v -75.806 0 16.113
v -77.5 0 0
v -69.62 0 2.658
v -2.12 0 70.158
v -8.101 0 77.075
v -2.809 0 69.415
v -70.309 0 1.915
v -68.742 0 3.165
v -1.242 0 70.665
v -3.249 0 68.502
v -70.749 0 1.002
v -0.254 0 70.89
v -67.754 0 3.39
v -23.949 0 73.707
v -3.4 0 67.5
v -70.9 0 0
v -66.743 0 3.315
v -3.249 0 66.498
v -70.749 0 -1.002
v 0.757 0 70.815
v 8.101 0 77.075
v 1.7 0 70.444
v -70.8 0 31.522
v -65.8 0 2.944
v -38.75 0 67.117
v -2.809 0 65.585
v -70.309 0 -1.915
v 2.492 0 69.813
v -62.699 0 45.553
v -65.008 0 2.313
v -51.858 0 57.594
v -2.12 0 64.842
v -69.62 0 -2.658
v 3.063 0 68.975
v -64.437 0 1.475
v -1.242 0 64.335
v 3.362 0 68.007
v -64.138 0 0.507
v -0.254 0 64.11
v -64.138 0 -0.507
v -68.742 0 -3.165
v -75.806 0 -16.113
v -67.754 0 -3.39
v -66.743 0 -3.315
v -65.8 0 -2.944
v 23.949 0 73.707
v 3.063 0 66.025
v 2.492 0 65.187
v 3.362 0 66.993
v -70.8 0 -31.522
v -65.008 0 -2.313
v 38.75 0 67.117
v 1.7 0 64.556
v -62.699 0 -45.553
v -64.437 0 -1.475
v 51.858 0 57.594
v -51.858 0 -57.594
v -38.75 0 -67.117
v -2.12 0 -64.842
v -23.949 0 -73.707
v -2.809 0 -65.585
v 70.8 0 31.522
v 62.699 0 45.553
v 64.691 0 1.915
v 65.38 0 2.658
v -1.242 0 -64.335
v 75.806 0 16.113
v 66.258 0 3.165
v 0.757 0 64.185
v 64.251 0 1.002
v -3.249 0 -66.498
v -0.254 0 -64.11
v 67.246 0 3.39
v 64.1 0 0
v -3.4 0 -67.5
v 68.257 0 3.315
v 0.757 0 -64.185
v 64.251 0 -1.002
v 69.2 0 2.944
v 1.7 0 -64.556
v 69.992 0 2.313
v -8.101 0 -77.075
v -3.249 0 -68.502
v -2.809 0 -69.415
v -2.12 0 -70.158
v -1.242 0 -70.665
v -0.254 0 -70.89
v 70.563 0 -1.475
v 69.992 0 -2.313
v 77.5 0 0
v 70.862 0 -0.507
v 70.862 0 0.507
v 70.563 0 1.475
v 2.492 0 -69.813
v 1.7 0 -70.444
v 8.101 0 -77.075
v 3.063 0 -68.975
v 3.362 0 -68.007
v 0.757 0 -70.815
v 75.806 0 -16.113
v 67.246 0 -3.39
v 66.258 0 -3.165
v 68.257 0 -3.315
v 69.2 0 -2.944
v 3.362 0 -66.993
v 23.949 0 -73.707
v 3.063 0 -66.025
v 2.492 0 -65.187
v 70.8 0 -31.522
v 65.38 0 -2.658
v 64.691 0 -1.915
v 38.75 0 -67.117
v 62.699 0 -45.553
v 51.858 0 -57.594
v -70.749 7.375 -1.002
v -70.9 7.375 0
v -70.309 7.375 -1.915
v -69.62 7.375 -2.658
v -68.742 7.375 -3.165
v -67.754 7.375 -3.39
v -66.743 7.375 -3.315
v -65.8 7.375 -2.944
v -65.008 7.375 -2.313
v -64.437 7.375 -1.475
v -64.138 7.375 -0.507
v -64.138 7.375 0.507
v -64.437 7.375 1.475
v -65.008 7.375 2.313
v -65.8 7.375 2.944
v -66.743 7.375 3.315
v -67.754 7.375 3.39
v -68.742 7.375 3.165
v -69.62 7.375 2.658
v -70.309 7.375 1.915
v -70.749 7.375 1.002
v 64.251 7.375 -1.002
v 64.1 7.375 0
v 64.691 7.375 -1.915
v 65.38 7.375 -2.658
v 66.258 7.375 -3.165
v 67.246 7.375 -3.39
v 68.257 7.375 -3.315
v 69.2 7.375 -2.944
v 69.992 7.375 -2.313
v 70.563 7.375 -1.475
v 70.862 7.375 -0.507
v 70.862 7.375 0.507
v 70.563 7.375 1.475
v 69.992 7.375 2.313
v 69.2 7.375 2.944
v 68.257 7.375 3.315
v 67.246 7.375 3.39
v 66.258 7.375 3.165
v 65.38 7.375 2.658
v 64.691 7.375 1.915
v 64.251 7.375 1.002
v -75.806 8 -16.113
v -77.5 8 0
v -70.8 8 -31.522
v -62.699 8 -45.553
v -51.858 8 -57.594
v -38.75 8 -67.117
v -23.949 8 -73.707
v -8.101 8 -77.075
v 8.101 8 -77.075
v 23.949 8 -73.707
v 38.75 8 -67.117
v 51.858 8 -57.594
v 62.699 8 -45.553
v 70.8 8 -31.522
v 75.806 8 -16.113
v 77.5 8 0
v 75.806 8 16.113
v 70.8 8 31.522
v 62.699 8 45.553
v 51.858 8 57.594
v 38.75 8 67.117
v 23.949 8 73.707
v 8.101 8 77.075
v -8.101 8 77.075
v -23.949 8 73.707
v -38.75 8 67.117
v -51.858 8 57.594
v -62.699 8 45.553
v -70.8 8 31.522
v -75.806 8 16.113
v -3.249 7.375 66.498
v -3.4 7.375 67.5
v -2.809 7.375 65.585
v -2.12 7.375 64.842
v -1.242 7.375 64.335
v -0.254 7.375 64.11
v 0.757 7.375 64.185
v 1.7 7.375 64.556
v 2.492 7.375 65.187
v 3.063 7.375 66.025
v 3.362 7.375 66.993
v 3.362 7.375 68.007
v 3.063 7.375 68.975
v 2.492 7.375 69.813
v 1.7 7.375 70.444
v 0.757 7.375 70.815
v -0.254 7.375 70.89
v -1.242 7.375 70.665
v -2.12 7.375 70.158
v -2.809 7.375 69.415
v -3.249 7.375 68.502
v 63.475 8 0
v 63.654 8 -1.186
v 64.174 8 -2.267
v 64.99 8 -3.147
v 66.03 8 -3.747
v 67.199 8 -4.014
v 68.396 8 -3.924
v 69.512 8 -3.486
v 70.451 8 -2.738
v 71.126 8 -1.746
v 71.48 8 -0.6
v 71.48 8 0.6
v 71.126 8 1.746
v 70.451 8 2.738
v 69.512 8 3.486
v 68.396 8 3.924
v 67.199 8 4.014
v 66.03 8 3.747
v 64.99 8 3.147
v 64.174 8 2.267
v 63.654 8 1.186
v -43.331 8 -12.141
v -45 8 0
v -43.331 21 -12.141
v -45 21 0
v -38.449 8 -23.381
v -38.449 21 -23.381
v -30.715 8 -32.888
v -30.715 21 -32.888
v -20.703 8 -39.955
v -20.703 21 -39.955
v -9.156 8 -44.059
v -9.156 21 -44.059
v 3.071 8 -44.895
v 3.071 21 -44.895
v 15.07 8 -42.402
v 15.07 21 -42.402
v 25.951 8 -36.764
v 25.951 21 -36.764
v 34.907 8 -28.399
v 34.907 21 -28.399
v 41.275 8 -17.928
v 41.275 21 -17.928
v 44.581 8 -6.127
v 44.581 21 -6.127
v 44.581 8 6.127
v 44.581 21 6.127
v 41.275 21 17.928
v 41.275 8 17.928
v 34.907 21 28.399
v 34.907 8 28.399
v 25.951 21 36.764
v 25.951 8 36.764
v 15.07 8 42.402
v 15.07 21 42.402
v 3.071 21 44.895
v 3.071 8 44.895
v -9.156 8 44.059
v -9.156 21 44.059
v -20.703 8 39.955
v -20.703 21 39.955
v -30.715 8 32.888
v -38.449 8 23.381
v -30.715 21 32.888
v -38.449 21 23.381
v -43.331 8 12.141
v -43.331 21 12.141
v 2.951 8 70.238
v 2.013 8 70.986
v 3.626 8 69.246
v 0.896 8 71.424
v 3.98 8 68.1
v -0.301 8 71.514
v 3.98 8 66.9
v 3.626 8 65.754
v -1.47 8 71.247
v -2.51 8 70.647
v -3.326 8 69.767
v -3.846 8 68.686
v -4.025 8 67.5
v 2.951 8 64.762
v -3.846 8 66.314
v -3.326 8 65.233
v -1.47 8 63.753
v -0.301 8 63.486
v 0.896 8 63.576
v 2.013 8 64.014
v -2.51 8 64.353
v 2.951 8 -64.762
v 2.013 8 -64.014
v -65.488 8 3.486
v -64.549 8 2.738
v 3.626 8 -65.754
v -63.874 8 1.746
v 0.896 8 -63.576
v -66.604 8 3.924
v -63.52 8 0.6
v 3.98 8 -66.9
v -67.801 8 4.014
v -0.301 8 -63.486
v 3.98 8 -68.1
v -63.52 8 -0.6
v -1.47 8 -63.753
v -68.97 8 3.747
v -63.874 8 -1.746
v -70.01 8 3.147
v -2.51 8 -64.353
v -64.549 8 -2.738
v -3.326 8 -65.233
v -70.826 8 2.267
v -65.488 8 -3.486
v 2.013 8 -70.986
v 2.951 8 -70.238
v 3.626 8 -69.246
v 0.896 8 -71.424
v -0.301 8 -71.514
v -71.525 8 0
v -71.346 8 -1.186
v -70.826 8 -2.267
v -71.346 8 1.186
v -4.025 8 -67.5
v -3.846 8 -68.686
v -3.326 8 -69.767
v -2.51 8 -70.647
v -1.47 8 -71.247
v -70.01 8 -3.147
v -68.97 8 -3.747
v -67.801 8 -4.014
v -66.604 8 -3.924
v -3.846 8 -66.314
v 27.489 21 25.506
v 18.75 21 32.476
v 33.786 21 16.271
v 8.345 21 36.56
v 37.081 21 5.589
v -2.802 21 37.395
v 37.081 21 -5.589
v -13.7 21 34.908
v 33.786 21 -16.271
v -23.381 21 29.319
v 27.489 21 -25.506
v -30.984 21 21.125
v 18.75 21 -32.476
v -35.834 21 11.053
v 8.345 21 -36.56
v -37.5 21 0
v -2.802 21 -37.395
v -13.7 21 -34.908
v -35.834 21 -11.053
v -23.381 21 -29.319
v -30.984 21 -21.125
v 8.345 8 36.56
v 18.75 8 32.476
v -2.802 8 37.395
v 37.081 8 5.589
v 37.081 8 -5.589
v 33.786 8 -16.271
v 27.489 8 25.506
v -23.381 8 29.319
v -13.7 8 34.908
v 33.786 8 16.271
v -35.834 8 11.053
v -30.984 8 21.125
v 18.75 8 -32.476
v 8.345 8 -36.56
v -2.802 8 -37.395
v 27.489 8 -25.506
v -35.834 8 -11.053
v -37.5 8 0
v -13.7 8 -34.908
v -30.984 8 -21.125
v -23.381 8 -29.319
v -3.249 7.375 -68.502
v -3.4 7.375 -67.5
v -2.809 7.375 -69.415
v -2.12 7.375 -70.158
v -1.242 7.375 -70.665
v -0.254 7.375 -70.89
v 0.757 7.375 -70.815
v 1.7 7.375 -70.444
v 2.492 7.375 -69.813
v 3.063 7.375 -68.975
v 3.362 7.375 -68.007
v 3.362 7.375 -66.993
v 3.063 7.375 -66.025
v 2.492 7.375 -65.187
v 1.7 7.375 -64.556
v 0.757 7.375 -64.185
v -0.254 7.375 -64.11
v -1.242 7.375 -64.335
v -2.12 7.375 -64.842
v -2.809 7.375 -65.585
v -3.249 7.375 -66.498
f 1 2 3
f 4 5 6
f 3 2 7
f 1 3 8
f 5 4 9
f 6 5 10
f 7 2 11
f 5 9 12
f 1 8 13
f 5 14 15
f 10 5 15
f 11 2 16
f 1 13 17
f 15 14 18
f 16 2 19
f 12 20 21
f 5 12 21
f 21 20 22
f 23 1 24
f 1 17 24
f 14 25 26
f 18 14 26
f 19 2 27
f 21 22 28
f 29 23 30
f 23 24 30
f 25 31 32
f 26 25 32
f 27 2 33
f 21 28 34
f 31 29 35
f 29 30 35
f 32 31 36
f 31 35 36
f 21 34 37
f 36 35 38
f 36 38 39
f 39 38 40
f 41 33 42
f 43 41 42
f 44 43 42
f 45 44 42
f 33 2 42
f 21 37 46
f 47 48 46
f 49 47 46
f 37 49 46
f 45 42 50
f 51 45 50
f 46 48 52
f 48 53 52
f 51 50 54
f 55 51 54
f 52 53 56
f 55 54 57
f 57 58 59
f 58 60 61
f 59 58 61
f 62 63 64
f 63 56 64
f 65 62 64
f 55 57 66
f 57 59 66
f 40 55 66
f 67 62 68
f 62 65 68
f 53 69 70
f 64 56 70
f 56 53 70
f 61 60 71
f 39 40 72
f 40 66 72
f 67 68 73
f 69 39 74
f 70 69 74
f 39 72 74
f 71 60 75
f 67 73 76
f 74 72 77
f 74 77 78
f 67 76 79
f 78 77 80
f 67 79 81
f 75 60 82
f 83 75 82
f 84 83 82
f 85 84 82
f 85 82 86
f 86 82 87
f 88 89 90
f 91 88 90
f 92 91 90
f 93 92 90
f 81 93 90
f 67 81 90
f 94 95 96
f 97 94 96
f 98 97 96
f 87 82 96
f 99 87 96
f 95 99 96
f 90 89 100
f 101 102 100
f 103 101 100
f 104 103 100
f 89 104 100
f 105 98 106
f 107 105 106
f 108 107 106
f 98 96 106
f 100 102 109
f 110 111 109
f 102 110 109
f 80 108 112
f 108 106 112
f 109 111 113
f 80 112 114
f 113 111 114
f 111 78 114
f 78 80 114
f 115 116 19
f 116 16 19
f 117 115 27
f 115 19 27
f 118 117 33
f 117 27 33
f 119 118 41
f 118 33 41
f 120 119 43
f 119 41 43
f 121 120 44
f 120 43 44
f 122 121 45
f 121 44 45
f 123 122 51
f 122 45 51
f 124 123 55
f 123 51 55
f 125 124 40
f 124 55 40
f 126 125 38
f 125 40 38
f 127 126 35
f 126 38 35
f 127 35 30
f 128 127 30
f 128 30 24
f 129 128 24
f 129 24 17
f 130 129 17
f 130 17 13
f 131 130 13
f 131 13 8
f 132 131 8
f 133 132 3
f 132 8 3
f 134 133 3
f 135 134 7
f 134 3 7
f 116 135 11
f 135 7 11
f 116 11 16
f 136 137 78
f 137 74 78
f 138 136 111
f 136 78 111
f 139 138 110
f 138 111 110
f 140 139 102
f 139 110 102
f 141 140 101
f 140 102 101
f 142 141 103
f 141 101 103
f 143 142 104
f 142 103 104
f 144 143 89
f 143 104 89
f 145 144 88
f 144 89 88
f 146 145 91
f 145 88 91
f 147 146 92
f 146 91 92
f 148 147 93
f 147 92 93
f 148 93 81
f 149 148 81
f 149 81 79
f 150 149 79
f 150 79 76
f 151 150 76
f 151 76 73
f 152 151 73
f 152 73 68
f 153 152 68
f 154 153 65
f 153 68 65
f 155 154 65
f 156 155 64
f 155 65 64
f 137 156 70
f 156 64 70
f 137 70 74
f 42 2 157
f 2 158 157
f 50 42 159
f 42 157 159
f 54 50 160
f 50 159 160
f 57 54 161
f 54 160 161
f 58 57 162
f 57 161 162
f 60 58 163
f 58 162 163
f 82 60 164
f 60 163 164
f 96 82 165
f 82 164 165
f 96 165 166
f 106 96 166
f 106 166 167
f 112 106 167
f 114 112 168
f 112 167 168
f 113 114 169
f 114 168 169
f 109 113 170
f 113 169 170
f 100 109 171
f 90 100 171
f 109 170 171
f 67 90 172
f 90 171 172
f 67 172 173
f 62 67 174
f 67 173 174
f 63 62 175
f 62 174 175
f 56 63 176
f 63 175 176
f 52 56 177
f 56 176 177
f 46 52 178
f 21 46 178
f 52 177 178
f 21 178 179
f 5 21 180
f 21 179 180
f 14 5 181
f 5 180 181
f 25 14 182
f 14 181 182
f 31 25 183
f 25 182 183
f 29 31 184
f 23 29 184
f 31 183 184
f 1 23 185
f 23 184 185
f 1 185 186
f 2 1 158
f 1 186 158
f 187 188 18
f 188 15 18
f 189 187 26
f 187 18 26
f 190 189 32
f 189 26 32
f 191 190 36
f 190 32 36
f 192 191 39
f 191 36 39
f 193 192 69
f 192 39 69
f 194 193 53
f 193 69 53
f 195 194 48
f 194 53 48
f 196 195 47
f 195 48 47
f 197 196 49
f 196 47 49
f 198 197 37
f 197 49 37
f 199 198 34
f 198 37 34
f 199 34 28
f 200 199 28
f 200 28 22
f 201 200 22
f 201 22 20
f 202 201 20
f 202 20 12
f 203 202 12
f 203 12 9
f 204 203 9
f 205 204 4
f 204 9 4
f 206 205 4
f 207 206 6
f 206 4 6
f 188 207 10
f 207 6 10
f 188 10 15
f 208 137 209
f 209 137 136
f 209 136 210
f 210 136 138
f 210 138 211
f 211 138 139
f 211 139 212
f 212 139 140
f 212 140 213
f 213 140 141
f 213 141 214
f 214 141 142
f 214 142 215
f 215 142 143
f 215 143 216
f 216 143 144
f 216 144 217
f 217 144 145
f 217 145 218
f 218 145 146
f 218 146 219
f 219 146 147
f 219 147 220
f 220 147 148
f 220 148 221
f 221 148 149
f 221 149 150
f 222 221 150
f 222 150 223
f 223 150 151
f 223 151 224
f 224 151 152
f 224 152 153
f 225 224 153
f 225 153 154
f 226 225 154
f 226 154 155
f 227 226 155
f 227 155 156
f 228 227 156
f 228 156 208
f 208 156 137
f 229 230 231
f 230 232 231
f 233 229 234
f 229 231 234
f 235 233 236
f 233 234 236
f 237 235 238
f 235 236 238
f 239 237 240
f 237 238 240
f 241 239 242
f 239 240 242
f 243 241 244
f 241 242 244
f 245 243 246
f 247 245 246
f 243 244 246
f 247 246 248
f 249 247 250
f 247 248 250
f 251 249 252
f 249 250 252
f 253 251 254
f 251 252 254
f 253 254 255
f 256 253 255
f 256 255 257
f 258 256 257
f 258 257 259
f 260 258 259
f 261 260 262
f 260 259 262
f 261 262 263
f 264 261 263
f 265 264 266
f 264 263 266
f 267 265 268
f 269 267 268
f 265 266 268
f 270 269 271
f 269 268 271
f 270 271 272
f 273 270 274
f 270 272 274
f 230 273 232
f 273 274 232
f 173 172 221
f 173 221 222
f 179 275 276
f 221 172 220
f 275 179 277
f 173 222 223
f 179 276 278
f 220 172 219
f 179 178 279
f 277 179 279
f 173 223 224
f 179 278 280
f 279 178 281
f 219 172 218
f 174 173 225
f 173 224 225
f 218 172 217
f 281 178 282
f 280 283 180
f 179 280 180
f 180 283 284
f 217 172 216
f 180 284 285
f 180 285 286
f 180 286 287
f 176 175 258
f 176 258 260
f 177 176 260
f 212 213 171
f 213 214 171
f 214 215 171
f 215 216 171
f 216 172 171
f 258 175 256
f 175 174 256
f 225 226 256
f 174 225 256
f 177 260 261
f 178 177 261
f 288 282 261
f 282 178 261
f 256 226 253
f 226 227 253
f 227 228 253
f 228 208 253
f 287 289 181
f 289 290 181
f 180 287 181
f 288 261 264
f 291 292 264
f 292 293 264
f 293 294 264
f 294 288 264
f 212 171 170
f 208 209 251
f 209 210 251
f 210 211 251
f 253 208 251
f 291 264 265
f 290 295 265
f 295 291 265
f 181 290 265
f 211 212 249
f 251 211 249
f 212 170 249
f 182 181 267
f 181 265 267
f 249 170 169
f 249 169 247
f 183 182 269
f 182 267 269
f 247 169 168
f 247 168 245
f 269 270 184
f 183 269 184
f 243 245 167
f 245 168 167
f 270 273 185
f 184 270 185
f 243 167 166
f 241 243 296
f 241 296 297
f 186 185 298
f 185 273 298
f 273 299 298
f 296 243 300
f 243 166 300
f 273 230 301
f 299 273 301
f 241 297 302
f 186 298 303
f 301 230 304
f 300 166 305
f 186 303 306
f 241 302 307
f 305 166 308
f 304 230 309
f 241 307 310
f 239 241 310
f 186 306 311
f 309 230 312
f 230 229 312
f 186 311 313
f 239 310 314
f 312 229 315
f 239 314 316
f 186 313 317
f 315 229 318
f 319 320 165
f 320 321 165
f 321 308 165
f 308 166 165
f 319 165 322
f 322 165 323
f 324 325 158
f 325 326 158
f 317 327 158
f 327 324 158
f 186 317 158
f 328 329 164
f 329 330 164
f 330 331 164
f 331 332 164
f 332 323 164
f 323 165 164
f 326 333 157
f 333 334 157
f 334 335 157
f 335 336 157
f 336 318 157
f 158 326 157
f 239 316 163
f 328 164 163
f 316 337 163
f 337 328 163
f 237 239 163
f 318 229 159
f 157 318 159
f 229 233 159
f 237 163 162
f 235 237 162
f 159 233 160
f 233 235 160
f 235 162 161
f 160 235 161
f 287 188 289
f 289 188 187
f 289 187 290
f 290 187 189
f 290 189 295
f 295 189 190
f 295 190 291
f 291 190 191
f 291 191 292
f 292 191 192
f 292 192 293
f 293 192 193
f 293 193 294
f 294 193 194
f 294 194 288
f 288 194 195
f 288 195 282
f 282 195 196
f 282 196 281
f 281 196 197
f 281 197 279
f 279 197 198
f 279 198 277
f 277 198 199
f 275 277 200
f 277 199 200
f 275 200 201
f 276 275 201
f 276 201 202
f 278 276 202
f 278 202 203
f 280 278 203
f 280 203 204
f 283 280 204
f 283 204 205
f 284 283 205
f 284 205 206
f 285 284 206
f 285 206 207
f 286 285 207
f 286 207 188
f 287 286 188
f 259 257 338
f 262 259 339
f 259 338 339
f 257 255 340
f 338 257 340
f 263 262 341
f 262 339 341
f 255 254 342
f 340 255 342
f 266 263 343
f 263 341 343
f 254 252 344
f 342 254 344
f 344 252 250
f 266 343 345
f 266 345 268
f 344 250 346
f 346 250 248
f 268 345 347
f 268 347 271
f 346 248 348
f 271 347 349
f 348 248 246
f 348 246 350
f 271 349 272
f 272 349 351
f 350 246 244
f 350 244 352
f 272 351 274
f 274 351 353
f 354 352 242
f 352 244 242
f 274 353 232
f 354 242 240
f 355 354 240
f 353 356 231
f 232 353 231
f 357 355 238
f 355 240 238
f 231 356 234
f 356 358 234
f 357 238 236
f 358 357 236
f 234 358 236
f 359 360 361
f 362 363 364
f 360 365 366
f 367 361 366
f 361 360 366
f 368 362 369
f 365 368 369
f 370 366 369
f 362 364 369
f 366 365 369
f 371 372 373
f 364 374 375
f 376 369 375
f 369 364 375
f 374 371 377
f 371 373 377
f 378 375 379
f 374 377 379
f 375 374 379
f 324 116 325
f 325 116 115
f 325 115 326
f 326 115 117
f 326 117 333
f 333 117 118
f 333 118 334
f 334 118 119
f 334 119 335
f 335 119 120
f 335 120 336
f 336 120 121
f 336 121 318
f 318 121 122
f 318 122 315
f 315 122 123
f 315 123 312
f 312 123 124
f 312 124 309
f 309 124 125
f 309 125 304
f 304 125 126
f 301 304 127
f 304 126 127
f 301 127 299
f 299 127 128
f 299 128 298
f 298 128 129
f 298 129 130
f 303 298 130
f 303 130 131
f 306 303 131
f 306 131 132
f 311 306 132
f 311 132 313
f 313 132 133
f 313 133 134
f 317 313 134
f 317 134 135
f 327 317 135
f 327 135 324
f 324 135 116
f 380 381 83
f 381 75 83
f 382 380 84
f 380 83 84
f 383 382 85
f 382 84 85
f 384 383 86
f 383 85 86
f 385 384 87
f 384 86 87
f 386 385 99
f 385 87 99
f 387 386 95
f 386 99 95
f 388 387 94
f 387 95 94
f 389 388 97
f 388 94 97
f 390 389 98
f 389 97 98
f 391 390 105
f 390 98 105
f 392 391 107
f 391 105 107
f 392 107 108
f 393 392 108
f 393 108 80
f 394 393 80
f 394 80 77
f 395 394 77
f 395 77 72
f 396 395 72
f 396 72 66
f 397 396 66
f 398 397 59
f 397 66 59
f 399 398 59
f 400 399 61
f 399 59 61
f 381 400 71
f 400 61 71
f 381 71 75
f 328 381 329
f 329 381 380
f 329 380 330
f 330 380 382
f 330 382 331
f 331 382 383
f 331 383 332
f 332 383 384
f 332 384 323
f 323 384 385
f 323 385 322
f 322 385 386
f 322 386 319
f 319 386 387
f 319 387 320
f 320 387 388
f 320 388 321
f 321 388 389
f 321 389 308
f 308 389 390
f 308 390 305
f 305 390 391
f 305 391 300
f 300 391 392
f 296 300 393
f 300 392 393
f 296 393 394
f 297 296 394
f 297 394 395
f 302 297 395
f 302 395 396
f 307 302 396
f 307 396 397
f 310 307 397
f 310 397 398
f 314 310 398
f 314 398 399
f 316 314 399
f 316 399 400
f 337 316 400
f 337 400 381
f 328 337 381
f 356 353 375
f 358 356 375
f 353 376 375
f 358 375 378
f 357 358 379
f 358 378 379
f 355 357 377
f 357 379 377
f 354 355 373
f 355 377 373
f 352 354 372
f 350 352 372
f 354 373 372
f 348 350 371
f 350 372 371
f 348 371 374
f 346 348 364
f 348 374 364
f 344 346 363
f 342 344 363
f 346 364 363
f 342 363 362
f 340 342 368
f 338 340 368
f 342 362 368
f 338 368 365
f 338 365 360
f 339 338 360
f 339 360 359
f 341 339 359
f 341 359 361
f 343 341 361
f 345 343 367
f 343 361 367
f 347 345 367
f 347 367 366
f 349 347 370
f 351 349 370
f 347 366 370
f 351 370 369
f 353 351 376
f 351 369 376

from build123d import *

# Parameters (mm, degrees)
HOLE_WIZARD_M8_1_D           = 6.8
HOLE_WIZARD_M8_1_CSINK_D     = 8.05
HOLE_WIZARD_M8_1_CSINK_ANGLE = 90


with BuildPart() as part:
    # 草图1 → 旋转1 (revolve)
    with BuildSketch(Plane.XY, mode=Mode.PRIVATE) as revolve_1_sk:
        Polygon((0, 0), (77.5, 0), (77.5, 8), (45, 8), (45, 21), (37.5, 21), (37.5, 8), (0, 8), align=None)
    revolve(revolve_1_sk.sketch.rotate(Axis((0, 8, 0), (0, -1, 0)), 180), axis=Axis((0, 8, 0), (0, -1, 0)))

    # M8 螺纹孔1 (through all)
    with Locations(Plane(origin=(0, 8, 0), x_dir=(1, 0, 0), z_dir=(0, 1, 0))):
        with Locations((-67.5, 0), (67.5, 0), (0, -67.5), (0, 67.5)):
            CounterSinkHole(HOLE_WIZARD_M8_1_D / 2, HOLE_WIZARD_M8_1_CSINK_D / 2, counter_sink_angle=HOLE_WIZARD_M8_1_CSINK_ANGLE)


solid = part.part
